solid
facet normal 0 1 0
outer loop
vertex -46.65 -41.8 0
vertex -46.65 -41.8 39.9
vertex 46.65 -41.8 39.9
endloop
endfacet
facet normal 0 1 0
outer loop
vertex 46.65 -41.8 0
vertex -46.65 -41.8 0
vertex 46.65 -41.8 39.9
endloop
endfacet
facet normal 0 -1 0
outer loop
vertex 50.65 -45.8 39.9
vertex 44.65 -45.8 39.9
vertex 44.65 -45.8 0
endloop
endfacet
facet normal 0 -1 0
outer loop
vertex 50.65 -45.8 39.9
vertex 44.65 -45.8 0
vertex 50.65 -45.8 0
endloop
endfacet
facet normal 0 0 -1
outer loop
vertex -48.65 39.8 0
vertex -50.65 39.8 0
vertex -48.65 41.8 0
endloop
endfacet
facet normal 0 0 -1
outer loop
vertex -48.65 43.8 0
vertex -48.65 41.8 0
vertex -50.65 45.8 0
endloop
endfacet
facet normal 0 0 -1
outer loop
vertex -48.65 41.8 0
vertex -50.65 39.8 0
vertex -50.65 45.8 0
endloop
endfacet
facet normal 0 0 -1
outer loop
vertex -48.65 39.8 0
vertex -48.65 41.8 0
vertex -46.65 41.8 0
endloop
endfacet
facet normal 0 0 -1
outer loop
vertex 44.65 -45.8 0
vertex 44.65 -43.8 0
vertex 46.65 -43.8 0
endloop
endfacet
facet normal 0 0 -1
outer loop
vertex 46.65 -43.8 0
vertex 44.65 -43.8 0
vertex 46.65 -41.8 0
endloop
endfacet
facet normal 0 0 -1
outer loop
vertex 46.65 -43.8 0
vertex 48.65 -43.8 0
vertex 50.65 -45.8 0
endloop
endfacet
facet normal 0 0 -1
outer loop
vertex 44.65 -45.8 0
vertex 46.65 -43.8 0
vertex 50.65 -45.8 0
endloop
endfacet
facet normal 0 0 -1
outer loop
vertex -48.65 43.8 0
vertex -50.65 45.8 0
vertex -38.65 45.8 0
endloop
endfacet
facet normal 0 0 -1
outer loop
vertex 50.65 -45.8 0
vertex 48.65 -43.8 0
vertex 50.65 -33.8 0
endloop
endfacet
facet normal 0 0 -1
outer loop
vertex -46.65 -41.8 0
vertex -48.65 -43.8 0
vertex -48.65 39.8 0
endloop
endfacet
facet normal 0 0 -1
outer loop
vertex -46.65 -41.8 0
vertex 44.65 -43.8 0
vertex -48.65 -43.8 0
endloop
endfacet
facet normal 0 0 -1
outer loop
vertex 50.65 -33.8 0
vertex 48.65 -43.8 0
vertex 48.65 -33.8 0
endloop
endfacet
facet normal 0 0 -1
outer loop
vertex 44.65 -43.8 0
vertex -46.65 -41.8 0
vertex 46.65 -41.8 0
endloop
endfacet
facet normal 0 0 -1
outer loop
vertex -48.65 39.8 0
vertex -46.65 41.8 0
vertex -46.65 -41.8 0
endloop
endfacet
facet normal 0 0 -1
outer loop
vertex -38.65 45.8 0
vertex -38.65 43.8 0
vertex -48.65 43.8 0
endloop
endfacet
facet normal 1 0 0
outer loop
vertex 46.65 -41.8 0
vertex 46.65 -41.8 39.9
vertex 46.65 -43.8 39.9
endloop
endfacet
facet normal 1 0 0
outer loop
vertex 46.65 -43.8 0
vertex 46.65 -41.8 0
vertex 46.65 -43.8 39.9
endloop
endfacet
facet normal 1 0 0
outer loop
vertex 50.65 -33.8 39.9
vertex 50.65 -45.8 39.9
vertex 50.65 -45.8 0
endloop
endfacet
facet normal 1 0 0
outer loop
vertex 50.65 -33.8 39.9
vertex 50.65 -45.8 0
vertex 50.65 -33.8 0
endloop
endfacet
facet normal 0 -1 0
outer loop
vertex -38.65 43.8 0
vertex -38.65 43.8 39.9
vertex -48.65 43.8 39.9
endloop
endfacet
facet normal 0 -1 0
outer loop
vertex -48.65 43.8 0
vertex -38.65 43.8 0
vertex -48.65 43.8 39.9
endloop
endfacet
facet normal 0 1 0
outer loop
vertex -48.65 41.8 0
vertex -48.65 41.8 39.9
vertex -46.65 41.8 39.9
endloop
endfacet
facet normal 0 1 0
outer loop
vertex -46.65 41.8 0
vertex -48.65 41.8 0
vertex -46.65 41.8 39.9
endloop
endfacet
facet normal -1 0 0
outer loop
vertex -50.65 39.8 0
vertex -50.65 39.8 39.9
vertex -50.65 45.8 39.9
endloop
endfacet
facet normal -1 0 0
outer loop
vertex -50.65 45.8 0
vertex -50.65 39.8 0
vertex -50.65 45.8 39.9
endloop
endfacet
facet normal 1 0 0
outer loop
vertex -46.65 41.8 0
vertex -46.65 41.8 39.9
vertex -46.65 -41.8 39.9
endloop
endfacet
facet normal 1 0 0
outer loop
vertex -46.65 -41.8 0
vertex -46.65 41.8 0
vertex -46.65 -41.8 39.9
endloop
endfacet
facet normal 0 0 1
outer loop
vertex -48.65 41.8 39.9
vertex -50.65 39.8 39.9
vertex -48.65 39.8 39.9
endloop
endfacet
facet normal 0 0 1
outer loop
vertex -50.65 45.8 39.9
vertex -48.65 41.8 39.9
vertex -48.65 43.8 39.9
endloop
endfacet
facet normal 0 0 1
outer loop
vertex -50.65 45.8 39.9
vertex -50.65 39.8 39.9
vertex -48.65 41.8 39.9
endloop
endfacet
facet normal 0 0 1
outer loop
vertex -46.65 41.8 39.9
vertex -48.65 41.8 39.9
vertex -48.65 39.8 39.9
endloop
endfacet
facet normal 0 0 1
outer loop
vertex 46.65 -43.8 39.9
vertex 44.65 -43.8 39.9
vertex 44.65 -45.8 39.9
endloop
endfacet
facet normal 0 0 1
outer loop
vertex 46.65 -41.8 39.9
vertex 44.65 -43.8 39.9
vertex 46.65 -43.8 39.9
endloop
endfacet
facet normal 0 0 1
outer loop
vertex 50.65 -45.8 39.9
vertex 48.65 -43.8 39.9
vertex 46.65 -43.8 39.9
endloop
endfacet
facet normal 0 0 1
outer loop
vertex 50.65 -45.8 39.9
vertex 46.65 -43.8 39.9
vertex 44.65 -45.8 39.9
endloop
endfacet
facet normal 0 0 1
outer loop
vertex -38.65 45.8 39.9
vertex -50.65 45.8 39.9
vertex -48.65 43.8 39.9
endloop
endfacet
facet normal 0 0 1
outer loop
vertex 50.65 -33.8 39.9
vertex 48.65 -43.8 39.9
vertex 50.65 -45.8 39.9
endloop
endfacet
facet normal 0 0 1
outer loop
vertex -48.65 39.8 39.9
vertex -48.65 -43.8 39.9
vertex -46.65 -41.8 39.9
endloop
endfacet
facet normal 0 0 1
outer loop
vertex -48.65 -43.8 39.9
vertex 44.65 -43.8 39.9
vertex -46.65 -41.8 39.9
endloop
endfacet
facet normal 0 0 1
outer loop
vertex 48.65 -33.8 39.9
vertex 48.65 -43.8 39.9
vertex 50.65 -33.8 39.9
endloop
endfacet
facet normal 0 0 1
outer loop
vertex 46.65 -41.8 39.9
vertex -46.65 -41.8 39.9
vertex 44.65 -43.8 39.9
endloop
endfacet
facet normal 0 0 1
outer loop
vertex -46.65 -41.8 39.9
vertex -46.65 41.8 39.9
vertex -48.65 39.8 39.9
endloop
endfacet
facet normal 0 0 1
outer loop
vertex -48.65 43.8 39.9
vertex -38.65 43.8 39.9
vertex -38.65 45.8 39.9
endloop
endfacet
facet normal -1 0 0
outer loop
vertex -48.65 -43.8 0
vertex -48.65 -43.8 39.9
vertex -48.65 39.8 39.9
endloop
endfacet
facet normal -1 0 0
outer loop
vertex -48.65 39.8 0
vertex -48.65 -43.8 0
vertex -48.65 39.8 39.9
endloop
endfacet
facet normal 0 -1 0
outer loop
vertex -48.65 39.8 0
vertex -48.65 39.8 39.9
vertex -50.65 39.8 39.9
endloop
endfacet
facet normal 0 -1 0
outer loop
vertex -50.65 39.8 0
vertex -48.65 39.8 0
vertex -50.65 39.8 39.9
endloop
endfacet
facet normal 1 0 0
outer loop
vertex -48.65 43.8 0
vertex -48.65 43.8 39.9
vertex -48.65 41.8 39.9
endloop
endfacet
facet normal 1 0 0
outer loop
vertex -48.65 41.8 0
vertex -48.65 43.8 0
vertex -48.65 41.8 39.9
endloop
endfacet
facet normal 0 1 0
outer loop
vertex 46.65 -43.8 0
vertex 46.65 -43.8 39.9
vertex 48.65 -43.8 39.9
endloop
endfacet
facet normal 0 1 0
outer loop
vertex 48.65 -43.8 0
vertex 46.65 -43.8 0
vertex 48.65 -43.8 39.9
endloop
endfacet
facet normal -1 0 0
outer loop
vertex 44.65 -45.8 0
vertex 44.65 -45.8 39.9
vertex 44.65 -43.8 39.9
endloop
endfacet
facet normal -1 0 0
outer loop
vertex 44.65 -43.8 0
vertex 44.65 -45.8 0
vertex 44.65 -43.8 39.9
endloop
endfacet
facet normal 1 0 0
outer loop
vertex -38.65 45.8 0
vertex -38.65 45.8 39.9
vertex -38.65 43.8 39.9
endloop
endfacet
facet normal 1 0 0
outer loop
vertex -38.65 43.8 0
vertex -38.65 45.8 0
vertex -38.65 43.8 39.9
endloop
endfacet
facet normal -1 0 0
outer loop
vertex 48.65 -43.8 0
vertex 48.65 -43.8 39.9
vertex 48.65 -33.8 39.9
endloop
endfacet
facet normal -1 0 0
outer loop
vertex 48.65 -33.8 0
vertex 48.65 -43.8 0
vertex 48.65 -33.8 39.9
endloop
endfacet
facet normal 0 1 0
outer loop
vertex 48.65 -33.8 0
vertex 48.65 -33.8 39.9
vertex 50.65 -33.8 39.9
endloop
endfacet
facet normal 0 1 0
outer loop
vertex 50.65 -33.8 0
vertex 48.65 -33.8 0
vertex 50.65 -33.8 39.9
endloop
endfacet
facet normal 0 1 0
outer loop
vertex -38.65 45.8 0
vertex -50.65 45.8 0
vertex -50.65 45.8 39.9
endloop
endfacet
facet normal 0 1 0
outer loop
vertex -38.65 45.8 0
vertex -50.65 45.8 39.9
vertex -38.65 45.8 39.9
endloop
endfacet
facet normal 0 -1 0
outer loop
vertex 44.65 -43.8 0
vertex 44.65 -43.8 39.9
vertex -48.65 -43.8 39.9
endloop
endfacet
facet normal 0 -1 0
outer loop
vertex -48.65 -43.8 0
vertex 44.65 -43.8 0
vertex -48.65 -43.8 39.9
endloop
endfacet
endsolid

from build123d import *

# Parameters (mm, degrees)
F0_W     = 101.3
F0_H     = 91.6
F1_DEPTH = 39.9
F3_DEPTH = 39.9
F4_W     = 91.3
F4_H     = 81.6
F5_DEPTH = 25
F7_DEPTH = 40


with BuildPart() as f1:
    # F0 (on Top) → F1 (new body)
    with BuildSketch(Plane.XY):
        Rectangle(F0_W, F0_H)
    extrude(amount=F1_DEPTH)

    # F2 (on face) → F3 (cut)
    with BuildSketch(Plane.XY.offset(39.9)):
        Polygon((50.65, 45.8), (-38.65, 45.8), (-38.65, 43.8), (-48.65, 43.8), (-48.65, 41.8), (-46.65, 41.8), (-46.65, -41.8), (46.65, -41.8), (46.65, -43.8), (48.65, -43.8), (48.65, -33.8), (50.65, -33.8), align=None)
    extrude(amount=-F3_DEPTH, mode=Mode.SUBTRACT)

    # F4 (on face) → F5 (cut)
    with BuildSketch(Plane(origin=(0, 0, 0), x_dir=(1, 0, 0), z_dir=(0, 0, -1))):
        Rectangle(F4_W, F4_H)
    extrude(amount=-F5_DEPTH, mode=Mode.SUBTRACT)

    # F6 (on face) → F7 (cut)
    with BuildSketch(Plane.XY.offset(39.9)):
        Polygon((-48.65, 39.8), (-50.65, 39.8), (-50.65, -45.8), (44.65, -45.8), (44.65, -43.8), (-48.65, -43.8), align=None)
    extrude(amount=-F7_DEPTH, mode=Mode.SUBTRACT)


solid = f1.part
